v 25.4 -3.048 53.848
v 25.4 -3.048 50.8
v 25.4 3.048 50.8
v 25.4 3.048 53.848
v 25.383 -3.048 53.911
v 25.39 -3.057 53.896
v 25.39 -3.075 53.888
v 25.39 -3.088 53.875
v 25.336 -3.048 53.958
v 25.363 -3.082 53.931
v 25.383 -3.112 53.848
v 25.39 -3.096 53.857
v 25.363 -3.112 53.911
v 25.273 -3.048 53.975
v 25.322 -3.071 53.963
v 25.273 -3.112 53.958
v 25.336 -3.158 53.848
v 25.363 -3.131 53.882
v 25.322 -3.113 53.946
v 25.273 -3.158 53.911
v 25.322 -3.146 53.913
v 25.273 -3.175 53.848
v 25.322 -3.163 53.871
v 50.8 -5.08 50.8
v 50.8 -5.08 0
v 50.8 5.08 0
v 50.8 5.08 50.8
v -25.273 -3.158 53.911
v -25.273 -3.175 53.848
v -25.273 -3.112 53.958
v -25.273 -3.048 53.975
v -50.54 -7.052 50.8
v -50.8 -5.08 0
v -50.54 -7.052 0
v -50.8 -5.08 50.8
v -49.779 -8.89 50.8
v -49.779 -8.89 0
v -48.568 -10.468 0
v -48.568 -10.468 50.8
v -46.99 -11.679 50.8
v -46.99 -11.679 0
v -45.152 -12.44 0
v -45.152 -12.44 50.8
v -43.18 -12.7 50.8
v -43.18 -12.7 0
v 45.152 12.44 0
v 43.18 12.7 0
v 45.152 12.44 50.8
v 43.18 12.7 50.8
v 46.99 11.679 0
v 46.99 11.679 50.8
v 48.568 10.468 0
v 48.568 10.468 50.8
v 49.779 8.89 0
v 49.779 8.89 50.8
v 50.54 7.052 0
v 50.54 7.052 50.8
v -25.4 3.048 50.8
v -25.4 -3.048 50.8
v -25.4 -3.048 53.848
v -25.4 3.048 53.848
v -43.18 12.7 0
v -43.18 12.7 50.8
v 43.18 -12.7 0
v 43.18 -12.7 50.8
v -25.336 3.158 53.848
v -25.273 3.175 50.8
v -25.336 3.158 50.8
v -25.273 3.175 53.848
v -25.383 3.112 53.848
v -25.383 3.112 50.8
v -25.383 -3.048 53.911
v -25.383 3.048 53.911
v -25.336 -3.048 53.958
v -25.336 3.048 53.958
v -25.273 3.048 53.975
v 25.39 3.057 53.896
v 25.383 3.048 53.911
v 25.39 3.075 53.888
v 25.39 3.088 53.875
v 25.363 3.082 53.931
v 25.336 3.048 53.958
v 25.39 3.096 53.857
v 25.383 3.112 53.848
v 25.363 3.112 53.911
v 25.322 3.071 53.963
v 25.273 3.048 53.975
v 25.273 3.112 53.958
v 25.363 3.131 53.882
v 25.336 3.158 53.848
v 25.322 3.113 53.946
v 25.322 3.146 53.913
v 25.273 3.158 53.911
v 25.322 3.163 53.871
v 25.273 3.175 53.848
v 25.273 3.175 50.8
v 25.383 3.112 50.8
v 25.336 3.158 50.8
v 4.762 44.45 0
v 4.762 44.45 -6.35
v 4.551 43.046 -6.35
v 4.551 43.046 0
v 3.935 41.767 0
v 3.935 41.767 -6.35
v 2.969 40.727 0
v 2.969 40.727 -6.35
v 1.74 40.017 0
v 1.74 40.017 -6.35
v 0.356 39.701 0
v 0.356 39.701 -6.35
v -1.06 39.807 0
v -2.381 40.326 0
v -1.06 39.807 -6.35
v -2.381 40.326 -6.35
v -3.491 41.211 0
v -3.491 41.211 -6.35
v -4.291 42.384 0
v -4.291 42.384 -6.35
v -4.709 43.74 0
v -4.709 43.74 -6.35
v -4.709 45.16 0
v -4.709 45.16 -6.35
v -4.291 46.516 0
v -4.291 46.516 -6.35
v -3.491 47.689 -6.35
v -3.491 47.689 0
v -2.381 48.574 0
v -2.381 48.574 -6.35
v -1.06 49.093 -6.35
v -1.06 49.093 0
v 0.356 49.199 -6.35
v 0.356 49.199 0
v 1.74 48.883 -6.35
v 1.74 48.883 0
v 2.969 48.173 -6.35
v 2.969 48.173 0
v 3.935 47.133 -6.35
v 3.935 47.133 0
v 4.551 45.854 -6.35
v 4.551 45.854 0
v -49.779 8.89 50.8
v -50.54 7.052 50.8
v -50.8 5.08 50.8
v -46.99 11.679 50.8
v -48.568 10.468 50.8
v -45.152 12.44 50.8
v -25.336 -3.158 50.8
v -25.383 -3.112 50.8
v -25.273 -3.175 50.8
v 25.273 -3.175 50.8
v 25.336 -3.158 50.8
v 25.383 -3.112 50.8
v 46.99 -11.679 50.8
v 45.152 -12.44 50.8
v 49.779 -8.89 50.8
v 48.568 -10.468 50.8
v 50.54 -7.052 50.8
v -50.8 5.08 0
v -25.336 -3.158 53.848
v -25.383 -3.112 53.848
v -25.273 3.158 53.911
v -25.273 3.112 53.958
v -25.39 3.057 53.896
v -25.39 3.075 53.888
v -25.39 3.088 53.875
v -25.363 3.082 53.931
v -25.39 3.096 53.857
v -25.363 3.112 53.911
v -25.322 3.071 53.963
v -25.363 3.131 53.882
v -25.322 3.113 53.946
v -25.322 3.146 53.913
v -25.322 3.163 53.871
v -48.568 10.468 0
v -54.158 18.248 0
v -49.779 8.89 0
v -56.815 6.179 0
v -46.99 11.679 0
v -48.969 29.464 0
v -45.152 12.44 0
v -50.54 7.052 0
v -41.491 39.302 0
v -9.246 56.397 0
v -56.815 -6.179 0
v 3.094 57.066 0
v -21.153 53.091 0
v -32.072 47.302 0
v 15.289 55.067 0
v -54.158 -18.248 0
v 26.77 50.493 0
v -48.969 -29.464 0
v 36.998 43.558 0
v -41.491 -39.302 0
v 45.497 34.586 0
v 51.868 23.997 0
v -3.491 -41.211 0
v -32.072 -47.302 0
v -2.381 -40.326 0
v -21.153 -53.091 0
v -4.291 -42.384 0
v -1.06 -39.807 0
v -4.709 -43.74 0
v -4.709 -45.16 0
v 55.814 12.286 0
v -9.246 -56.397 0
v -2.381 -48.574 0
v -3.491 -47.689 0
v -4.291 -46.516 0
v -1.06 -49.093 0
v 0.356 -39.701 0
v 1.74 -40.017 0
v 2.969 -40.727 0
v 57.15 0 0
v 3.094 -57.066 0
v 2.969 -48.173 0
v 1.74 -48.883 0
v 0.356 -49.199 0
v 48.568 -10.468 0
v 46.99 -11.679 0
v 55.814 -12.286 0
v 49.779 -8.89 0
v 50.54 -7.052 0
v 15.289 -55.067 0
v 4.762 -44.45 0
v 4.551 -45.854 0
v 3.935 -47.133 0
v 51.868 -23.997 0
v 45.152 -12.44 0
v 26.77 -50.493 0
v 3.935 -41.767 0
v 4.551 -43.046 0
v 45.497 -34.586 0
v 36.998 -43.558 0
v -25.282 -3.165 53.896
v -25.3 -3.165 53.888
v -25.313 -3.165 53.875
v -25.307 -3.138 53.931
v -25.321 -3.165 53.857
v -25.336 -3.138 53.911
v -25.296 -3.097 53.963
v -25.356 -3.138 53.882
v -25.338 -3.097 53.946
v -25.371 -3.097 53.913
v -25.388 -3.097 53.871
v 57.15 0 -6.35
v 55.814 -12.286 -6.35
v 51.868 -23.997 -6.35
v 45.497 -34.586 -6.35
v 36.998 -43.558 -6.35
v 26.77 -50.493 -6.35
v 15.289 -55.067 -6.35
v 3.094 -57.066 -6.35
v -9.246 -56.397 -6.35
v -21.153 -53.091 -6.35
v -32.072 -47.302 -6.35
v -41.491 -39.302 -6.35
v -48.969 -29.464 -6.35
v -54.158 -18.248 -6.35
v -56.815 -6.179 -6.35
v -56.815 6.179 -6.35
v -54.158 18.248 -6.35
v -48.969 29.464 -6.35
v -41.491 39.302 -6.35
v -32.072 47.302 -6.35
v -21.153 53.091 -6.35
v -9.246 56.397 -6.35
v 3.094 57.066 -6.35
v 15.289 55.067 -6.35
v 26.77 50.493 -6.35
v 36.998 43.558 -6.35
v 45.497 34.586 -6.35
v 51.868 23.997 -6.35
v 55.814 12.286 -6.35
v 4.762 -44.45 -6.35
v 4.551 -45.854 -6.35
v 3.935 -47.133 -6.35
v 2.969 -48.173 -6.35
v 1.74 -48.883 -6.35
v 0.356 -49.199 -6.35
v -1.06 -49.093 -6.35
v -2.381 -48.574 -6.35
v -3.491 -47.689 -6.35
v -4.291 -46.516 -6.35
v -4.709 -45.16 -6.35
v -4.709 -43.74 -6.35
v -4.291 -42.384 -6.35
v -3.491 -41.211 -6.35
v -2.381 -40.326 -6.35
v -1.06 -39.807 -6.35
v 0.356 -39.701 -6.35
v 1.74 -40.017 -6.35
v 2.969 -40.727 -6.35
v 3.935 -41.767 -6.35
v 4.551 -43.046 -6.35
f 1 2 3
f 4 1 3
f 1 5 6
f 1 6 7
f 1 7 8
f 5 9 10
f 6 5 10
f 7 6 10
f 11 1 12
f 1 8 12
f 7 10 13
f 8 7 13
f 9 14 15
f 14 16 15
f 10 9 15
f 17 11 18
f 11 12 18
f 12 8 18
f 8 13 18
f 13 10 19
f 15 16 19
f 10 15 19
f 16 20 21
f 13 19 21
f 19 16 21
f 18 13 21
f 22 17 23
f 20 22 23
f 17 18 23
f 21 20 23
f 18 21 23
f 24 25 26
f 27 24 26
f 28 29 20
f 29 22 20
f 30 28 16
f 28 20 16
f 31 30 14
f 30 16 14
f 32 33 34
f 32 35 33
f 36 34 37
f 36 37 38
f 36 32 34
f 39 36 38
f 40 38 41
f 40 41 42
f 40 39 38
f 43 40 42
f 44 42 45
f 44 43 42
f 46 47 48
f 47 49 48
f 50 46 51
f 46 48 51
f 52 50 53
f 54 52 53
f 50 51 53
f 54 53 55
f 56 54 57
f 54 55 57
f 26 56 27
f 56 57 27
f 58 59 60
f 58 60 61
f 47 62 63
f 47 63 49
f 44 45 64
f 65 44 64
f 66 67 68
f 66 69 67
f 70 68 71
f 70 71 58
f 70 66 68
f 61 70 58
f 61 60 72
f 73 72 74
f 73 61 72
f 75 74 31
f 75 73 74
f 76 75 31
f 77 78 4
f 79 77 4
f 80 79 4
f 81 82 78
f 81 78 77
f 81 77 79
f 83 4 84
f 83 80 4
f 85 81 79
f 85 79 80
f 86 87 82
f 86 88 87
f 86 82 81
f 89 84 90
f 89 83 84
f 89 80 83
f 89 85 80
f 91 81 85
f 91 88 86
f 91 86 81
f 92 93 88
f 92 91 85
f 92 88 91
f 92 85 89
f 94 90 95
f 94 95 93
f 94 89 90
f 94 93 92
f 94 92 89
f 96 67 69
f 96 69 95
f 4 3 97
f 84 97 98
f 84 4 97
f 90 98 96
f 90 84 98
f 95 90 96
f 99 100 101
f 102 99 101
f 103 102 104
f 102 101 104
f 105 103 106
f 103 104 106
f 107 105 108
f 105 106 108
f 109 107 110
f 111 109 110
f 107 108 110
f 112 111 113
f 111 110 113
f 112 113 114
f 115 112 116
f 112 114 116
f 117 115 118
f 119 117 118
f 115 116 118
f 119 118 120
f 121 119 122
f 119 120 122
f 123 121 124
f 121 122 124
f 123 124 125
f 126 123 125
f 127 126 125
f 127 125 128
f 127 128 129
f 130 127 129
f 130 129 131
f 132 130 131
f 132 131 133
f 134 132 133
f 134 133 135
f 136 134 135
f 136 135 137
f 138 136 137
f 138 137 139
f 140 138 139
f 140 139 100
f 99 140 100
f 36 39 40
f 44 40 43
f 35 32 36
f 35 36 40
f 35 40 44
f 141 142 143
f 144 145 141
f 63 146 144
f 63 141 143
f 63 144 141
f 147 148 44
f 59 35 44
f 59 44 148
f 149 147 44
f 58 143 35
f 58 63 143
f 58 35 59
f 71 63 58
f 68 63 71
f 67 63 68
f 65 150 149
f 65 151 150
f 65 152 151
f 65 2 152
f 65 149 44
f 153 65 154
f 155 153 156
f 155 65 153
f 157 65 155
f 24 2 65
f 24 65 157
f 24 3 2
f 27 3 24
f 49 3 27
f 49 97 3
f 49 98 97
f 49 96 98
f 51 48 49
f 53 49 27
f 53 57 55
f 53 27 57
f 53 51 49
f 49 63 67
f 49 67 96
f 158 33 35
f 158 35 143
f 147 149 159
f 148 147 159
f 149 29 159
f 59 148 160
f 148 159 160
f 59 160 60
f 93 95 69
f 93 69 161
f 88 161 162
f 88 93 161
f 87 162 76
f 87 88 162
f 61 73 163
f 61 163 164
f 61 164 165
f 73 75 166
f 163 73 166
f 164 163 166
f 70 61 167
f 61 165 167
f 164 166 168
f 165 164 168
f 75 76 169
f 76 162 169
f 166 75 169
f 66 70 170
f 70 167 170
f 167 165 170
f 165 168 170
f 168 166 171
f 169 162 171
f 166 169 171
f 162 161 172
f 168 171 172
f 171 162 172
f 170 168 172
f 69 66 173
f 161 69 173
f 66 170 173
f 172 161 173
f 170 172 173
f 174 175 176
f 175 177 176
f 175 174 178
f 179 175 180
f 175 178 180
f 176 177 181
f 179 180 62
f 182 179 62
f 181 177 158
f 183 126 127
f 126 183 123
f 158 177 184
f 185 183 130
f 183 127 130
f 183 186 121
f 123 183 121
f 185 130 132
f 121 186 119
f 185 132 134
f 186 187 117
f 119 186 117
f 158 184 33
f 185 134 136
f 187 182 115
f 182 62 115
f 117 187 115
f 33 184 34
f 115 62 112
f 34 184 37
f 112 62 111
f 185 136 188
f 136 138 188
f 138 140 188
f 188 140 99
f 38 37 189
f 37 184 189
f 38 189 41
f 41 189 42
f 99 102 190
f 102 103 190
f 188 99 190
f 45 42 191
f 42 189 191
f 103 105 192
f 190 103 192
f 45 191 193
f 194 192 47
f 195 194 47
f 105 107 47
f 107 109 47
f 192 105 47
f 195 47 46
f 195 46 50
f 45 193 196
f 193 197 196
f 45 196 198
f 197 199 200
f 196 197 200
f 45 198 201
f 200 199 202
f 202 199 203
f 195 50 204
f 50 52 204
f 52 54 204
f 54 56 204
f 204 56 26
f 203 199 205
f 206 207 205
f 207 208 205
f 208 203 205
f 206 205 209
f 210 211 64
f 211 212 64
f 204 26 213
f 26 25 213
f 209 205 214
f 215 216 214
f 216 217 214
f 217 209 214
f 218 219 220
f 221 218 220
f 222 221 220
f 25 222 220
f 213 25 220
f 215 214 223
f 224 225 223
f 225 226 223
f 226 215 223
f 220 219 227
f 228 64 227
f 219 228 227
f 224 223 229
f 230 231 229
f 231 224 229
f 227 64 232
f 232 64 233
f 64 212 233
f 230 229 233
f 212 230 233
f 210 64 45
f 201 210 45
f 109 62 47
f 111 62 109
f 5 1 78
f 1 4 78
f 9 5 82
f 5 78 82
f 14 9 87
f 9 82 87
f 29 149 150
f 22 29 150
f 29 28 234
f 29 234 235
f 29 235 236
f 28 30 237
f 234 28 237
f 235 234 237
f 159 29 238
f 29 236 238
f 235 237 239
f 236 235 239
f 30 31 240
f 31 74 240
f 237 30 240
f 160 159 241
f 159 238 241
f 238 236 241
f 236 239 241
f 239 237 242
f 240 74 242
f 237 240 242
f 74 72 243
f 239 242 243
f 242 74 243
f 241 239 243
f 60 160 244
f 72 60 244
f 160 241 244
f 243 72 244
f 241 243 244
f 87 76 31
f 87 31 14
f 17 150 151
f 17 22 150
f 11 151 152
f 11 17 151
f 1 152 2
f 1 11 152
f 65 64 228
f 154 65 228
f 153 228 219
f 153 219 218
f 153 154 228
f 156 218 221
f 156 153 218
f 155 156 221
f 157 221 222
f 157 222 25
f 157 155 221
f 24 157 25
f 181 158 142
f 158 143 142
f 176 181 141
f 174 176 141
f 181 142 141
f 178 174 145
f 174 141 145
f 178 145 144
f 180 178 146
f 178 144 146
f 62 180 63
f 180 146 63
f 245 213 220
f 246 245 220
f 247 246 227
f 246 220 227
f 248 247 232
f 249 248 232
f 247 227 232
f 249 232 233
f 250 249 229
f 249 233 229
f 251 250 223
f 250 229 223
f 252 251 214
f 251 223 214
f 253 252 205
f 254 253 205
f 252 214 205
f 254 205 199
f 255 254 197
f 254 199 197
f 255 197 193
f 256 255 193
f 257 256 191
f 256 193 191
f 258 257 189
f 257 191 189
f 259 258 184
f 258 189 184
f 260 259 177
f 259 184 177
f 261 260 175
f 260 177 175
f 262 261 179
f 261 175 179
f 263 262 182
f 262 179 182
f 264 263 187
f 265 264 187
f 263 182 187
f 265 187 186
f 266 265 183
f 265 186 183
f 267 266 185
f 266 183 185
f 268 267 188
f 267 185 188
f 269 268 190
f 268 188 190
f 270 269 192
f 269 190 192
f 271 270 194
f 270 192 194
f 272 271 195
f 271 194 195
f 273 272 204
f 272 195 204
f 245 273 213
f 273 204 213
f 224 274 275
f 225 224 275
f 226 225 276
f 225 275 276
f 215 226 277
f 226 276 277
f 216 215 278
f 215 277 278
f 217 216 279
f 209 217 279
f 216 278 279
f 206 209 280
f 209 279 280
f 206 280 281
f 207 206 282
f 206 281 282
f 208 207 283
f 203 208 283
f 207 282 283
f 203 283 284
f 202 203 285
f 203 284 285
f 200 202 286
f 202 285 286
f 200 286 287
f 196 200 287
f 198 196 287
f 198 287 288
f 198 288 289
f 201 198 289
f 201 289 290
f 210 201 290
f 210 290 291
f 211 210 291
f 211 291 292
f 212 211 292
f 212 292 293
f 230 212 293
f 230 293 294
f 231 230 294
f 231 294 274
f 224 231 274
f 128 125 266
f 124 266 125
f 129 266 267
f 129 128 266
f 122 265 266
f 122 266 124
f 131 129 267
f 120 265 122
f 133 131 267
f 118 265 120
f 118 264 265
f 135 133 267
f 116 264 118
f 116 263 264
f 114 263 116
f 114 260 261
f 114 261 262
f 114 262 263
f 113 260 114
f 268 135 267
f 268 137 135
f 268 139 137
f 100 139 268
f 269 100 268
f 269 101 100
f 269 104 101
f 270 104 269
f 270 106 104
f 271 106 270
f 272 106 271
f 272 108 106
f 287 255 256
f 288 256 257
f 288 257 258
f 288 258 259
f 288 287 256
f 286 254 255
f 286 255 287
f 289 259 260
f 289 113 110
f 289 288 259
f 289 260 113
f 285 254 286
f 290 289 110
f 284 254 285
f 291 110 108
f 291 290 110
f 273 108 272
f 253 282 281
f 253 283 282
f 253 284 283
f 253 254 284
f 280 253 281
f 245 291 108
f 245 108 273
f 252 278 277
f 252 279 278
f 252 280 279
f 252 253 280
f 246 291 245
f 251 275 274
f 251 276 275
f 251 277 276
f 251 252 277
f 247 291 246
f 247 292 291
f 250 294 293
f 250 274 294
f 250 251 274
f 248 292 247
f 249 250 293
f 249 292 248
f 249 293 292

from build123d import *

# Parameters (mm, degrees)
F0_W     = 101.6
F0_H     = 25.4
F1_DEPTH = 50.8
F2_W     = 50.8
F2_H     = 6.35
F3_DEPTH = 3.175
F4_R     = 57.15
F5_DEPTH = 6.35
F6_R     = 4.7625
F7_DEPTH = 25.4
F8_R     = 7.62
F9_R     = 0.127


with BuildPart() as f1:
    # F0 (on Top) → F1 (new body)
    with BuildSketch(Plane.XY):
        Rectangle(F0_W, F0_H)
    extrude(amount=F1_DEPTH)

    # F2 (on face) → F3 (join)
    with BuildSketch(Plane.XY.offset(50.8)):
        Rectangle(F2_W, F2_H)
    extrude(amount=F3_DEPTH)

    # F4 (on face) → F5 (join)
    with BuildSketch(Plane(origin=(0, 0, 0), x_dir=(1, 0, 0), z_dir=(0, 0, -1))):
        Circle(F4_R)
    extrude(amount=F5_DEPTH)

    # F6 (on face) → F7 (cut)
    with BuildSketch(Plane(origin=(0, 0, -6.35), x_dir=(1, 0, 0), z_dir=(0, 0, -1))):
        with Locations((0, 44.45)):
            Circle(F6_R)
        with Locations((0, -44.45)):
            Circle(F6_R)
    extrude(amount=-F7_DEPTH, mode=Mode.SUBTRACT)

    # F8
    f8_edges = [f1.edges().sort_by_distance(p)[0] for p in [
        (50.8, -12.7, 25.4),
        (50.8, 12.7, 25.4),
        (-50.8, -12.7, 25.4),
        (-50.8, 12.7, 25.4),
    ]]
    fillet(f8_edges, radius=F8_R)

    # F9
    f9_edges = [f1.edges().sort_by_distance(p)[0] for p in [
        (0, 3.175, 53.975),
        (-25.4, 0, 53.975),
        (0, -3.175, 53.975),
        (25.4, 0, 53.975),
        (25.4, -3.175, 52.3875),
        (25.4, 3.175, 52.3875),
        (-25.4, -3.175, 52.3875),
        (-25.4, 3.175, 52.3875),
    ]]
    fillet(f9_edges, radius=F9_R)


solid = f1.part
